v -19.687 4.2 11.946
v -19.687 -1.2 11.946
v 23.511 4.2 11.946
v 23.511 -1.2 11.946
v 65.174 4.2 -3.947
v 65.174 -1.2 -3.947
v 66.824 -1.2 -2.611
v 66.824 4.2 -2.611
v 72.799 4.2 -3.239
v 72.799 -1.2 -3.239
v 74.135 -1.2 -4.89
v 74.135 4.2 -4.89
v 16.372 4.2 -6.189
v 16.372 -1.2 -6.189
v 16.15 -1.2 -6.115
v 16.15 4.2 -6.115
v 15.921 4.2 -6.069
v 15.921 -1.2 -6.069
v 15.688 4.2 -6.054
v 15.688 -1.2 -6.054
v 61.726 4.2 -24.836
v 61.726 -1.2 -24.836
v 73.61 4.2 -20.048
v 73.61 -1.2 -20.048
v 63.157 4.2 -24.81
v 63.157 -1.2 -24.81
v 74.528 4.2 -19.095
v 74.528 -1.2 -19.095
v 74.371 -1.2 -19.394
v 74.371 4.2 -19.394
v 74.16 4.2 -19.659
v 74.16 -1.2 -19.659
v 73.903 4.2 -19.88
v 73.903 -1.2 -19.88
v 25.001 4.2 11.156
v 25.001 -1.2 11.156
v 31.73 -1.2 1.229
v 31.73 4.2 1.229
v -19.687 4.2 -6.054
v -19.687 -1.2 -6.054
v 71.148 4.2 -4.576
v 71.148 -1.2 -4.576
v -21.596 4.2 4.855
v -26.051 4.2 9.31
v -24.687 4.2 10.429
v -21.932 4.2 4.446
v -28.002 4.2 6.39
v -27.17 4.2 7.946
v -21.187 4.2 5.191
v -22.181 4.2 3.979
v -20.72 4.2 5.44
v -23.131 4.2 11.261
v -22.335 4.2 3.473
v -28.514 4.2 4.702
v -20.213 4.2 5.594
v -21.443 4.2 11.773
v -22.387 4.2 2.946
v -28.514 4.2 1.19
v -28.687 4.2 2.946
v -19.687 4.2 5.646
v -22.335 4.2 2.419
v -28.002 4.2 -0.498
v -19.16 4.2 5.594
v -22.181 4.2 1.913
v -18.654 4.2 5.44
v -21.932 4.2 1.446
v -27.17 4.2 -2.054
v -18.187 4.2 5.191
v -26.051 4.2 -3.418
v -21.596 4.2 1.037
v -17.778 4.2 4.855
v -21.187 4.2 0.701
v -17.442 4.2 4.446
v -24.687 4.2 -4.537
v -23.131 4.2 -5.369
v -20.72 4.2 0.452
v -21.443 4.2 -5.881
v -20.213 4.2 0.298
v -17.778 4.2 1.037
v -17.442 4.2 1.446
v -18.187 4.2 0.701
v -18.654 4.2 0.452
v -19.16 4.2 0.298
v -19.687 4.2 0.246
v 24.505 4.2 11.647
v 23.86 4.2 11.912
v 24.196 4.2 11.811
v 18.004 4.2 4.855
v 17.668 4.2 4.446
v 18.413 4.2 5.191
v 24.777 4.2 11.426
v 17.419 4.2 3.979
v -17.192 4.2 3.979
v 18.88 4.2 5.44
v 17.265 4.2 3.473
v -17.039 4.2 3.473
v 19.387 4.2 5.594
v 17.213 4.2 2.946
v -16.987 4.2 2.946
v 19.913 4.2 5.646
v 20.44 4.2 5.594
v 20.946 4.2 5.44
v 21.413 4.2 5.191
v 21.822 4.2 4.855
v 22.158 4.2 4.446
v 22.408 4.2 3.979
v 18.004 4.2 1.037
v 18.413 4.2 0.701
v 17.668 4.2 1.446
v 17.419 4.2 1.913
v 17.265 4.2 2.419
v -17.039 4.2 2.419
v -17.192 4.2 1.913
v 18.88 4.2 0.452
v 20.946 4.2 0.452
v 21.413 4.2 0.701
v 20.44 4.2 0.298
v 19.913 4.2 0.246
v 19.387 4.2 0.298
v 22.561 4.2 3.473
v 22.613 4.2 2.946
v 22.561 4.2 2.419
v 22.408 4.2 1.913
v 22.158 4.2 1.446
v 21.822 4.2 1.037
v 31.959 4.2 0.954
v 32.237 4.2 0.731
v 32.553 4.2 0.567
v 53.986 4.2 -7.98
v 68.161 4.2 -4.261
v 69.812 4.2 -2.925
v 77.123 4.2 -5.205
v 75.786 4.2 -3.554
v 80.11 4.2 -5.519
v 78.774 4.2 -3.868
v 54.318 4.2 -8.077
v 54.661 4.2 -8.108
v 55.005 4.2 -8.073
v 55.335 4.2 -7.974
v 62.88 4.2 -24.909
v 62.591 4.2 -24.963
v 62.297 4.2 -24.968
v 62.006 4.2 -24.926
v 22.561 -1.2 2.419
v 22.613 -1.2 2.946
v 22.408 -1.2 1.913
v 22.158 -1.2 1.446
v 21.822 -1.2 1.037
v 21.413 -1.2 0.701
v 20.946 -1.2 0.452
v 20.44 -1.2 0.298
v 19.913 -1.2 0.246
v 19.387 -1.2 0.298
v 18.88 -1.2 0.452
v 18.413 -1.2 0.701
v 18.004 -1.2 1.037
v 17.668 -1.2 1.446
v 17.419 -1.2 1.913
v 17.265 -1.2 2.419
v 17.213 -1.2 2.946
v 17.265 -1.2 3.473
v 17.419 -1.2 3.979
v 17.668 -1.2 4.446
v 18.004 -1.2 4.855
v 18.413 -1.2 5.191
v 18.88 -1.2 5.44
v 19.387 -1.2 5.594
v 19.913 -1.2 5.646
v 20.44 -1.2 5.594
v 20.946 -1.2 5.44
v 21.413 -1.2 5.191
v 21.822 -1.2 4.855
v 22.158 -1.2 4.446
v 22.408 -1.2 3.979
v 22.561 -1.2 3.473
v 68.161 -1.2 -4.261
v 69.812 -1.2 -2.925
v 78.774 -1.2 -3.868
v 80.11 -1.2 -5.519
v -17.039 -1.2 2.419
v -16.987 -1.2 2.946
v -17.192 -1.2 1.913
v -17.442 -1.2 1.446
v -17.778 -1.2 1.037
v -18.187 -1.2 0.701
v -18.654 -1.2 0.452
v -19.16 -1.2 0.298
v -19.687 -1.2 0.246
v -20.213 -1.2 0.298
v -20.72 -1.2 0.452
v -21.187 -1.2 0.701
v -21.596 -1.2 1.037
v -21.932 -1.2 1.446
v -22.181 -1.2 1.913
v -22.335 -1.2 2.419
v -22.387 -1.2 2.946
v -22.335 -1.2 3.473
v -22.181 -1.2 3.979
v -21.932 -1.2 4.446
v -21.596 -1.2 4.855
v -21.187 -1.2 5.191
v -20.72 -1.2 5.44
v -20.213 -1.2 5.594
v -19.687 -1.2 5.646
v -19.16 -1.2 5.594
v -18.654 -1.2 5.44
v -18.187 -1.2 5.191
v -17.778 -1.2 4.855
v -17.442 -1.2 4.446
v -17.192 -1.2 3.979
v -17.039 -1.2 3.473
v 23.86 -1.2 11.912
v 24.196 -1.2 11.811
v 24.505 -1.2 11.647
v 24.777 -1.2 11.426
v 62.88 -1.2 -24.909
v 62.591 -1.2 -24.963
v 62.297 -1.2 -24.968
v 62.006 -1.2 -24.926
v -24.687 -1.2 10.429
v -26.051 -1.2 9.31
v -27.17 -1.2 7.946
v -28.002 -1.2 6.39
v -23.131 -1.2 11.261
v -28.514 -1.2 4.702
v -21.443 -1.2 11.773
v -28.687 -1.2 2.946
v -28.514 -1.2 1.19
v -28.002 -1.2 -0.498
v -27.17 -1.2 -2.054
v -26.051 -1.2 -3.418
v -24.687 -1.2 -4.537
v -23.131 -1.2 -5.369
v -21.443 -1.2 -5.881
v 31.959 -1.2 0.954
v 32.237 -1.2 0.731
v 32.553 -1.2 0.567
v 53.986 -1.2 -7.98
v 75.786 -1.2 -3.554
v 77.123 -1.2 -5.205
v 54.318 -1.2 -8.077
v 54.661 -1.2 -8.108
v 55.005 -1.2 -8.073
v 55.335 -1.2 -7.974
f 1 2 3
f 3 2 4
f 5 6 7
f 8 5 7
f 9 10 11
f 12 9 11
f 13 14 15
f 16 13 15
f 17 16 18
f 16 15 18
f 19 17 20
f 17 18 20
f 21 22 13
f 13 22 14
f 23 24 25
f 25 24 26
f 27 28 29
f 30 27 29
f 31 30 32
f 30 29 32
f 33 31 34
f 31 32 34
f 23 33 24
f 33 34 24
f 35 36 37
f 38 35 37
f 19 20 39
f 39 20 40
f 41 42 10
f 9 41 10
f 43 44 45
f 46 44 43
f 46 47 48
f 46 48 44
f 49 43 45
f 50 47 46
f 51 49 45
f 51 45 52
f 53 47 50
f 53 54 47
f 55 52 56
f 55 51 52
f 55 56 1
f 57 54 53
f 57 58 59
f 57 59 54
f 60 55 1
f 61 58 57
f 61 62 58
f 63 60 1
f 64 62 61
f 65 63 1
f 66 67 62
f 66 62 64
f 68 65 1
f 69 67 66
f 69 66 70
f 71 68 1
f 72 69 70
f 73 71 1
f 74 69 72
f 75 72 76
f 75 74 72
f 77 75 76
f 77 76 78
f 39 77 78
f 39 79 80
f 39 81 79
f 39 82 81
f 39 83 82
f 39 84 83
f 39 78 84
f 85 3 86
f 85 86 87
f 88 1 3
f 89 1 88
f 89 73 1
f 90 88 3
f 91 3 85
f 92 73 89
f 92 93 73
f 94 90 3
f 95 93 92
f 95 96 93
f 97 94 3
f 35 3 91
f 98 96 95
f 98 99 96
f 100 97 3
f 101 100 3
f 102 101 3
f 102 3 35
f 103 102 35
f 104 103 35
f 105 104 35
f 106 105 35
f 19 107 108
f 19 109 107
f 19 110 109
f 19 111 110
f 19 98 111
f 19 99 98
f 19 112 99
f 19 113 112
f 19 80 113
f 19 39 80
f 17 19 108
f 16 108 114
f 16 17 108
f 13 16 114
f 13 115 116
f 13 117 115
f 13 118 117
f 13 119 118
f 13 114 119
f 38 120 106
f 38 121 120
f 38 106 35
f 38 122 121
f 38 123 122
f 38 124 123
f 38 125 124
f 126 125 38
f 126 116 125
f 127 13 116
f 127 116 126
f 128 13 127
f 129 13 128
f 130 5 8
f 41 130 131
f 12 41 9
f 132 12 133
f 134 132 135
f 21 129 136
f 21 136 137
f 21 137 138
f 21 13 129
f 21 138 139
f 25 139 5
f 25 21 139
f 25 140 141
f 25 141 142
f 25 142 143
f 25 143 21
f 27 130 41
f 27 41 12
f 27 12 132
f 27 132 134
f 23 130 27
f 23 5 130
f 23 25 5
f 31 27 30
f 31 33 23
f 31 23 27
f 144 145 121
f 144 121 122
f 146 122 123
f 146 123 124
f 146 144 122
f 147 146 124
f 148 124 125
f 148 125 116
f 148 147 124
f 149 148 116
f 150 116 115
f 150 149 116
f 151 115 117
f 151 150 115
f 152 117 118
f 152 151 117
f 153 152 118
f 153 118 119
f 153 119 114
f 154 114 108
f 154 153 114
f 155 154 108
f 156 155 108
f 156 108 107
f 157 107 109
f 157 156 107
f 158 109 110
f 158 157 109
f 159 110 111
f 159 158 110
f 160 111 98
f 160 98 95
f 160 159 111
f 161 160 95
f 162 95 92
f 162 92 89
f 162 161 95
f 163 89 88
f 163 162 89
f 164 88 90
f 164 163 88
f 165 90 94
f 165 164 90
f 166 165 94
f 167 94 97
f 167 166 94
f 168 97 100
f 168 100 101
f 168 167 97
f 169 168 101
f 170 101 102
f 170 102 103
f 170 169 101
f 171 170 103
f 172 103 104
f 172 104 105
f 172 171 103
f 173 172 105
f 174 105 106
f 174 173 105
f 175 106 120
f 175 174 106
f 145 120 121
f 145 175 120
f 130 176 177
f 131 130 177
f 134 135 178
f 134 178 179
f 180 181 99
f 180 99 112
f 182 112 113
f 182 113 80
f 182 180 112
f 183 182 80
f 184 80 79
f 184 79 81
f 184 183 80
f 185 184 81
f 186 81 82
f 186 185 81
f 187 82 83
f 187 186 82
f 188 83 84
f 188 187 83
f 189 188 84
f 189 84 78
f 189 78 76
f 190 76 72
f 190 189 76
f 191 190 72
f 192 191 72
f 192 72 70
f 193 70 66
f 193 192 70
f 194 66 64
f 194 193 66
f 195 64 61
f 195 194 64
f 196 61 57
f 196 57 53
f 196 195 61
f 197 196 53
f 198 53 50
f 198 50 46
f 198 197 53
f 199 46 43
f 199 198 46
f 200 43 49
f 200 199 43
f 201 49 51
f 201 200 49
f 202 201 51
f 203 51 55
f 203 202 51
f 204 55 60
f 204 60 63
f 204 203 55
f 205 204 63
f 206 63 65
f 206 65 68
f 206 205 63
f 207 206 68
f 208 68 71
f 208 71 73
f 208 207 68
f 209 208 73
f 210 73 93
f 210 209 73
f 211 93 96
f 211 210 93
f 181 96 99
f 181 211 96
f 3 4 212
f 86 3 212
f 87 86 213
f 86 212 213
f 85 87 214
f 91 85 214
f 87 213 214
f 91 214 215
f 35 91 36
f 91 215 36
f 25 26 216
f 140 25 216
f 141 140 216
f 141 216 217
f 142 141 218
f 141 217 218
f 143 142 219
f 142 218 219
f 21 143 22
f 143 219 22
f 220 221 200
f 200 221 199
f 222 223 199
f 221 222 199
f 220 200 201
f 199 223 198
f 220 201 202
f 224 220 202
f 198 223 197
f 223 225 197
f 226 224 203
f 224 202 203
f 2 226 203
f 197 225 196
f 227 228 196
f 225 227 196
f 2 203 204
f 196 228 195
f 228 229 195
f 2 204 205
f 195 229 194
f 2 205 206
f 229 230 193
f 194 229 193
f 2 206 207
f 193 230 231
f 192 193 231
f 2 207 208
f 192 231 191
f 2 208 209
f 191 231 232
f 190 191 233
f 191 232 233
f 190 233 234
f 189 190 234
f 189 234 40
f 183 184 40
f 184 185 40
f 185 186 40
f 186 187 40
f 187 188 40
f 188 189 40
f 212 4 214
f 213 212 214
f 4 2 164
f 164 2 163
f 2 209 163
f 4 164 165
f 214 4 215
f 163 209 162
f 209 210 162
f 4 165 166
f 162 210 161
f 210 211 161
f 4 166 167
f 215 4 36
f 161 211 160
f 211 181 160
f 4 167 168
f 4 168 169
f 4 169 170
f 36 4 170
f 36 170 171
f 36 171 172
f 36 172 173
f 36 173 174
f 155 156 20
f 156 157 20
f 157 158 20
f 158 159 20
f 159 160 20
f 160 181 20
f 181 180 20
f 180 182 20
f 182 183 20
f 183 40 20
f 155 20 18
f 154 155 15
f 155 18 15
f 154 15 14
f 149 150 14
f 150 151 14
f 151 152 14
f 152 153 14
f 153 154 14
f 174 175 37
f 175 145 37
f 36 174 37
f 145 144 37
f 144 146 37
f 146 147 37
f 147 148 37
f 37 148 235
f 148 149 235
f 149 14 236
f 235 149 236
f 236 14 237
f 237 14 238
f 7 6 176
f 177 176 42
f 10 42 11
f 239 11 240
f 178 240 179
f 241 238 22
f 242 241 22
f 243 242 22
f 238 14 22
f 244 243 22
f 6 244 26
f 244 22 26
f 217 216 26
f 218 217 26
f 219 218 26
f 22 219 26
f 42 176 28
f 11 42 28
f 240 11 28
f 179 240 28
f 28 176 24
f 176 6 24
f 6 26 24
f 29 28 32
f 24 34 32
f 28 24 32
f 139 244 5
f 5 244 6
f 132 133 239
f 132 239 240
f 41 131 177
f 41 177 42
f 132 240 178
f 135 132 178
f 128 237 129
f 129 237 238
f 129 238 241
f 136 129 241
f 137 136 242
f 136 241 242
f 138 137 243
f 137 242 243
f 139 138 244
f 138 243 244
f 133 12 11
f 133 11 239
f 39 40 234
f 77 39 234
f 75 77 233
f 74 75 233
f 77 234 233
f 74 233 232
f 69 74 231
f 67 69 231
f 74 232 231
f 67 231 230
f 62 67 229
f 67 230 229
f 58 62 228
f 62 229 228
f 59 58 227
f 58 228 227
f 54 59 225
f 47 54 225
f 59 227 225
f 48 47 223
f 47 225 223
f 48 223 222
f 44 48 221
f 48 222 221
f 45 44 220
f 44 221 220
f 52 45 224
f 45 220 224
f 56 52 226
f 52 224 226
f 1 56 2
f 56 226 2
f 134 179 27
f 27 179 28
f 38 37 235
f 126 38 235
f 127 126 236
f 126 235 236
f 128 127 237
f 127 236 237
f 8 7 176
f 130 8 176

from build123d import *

# Parameters (mm, degrees)
SKETCH1_R           = 1.5
BOSS_EXTRUDE1_DEPTH = 3
SCALE1_SCALE        = 1.8


with BuildPart() as part:
    # Sketch1 → Boss-Extrude1 (new body)
    with BuildSketch(Plane(origin=(0, 0, 0), x_dir=(1, 0, 0), z_dir=(0, 1, 0))):
        with BuildLine():
            Line((0, -5), (23.998875872, -5))
            ThreePointArc((23.998875872, -5), (24.467345461, -4.883479623), (24.826642543, -4.561072489))
            Line((24.826642543, -4.561072489), (28.564941326, 0.954149161))
            ThreePointArc((28.564941326, 0.954149161), (28.766036178, 1.172359953), (29.022312673, 1.321950886))
            Line((29.022312673, 1.321950886), (40.929553216, 6.070049343))
            ThreePointArc((40.929553216, 6.070049343), (41.304486381, 6.141164834), (41.678758689, 6.066649533))
            Line((41.678758689, 6.066649533), (47.144586244, 3.829406729))
            Line((47.144586244, 3.829406729), (48.06174016, 3.086958957))
            Line((48.06174016, 3.086958957), (48.804187932, 4.004112872))
            Line((48.804187932, 4.004112872), (49.721341848, 3.2616651))
            Line((49.721341848, 3.2616651), (50.46378962, 4.178819016))
            Line((50.46378962, 4.178819016), (51.380943536, 3.436371244))
            Line((51.380943536, 3.436371244), (52.123391308, 4.35352516))
            Line((52.123391308, 4.35352516), (53.040545224, 3.611077387))
            Line((53.040545224, 3.611077387), (53.782992996, 4.528231303))
            Line((53.782992996, 4.528231303), (54.700146912, 3.785783531))
            Line((54.700146912, 3.785783531), (55.442594685, 4.702937447))
            Line((55.442594685, 4.702937447), (52.341745918, 12.244834503))
            ThreePointArc((52.341745918, 12.244834503), (52.137055639, 12.558350103), (51.831402108, 12.774604725))
            Line((51.831402108, 12.774604725), (46.024183924, 15.419882568))
            ThreePointArc((46.024183924, 15.419882568), (45.628323444, 15.509674561), (45.229386093, 15.434727162))
            Line((45.229386093, 15.434727162), (20.032711481, 5.075121772))
            ThreePointArc((20.032711481, 5.075121772), (19.846254378, 5.018960187), (19.652448068, 5))
            Line((19.652448068, 5), (0, 5))
            ThreePointArc((0, 5), (-5, 0), (0, -5))
        make_face()
        Circle(SKETCH1_R, mode=Mode.SUBTRACT)
        with Locations((22, 0)):
            Circle(SKETCH1_R, mode=Mode.SUBTRACT)
    extrude(amount=BOSS_EXTRUDE1_DEPTH)


with BuildPart() as part_1:
    # Scale1: scaled about (24.6084342, 1.5, -3.682524739)
    add(part.part.scale(SCALE1_SCALE).moved(Location((-19.68674736, -1.2, 2.946019791))))


solid = part_1.part
